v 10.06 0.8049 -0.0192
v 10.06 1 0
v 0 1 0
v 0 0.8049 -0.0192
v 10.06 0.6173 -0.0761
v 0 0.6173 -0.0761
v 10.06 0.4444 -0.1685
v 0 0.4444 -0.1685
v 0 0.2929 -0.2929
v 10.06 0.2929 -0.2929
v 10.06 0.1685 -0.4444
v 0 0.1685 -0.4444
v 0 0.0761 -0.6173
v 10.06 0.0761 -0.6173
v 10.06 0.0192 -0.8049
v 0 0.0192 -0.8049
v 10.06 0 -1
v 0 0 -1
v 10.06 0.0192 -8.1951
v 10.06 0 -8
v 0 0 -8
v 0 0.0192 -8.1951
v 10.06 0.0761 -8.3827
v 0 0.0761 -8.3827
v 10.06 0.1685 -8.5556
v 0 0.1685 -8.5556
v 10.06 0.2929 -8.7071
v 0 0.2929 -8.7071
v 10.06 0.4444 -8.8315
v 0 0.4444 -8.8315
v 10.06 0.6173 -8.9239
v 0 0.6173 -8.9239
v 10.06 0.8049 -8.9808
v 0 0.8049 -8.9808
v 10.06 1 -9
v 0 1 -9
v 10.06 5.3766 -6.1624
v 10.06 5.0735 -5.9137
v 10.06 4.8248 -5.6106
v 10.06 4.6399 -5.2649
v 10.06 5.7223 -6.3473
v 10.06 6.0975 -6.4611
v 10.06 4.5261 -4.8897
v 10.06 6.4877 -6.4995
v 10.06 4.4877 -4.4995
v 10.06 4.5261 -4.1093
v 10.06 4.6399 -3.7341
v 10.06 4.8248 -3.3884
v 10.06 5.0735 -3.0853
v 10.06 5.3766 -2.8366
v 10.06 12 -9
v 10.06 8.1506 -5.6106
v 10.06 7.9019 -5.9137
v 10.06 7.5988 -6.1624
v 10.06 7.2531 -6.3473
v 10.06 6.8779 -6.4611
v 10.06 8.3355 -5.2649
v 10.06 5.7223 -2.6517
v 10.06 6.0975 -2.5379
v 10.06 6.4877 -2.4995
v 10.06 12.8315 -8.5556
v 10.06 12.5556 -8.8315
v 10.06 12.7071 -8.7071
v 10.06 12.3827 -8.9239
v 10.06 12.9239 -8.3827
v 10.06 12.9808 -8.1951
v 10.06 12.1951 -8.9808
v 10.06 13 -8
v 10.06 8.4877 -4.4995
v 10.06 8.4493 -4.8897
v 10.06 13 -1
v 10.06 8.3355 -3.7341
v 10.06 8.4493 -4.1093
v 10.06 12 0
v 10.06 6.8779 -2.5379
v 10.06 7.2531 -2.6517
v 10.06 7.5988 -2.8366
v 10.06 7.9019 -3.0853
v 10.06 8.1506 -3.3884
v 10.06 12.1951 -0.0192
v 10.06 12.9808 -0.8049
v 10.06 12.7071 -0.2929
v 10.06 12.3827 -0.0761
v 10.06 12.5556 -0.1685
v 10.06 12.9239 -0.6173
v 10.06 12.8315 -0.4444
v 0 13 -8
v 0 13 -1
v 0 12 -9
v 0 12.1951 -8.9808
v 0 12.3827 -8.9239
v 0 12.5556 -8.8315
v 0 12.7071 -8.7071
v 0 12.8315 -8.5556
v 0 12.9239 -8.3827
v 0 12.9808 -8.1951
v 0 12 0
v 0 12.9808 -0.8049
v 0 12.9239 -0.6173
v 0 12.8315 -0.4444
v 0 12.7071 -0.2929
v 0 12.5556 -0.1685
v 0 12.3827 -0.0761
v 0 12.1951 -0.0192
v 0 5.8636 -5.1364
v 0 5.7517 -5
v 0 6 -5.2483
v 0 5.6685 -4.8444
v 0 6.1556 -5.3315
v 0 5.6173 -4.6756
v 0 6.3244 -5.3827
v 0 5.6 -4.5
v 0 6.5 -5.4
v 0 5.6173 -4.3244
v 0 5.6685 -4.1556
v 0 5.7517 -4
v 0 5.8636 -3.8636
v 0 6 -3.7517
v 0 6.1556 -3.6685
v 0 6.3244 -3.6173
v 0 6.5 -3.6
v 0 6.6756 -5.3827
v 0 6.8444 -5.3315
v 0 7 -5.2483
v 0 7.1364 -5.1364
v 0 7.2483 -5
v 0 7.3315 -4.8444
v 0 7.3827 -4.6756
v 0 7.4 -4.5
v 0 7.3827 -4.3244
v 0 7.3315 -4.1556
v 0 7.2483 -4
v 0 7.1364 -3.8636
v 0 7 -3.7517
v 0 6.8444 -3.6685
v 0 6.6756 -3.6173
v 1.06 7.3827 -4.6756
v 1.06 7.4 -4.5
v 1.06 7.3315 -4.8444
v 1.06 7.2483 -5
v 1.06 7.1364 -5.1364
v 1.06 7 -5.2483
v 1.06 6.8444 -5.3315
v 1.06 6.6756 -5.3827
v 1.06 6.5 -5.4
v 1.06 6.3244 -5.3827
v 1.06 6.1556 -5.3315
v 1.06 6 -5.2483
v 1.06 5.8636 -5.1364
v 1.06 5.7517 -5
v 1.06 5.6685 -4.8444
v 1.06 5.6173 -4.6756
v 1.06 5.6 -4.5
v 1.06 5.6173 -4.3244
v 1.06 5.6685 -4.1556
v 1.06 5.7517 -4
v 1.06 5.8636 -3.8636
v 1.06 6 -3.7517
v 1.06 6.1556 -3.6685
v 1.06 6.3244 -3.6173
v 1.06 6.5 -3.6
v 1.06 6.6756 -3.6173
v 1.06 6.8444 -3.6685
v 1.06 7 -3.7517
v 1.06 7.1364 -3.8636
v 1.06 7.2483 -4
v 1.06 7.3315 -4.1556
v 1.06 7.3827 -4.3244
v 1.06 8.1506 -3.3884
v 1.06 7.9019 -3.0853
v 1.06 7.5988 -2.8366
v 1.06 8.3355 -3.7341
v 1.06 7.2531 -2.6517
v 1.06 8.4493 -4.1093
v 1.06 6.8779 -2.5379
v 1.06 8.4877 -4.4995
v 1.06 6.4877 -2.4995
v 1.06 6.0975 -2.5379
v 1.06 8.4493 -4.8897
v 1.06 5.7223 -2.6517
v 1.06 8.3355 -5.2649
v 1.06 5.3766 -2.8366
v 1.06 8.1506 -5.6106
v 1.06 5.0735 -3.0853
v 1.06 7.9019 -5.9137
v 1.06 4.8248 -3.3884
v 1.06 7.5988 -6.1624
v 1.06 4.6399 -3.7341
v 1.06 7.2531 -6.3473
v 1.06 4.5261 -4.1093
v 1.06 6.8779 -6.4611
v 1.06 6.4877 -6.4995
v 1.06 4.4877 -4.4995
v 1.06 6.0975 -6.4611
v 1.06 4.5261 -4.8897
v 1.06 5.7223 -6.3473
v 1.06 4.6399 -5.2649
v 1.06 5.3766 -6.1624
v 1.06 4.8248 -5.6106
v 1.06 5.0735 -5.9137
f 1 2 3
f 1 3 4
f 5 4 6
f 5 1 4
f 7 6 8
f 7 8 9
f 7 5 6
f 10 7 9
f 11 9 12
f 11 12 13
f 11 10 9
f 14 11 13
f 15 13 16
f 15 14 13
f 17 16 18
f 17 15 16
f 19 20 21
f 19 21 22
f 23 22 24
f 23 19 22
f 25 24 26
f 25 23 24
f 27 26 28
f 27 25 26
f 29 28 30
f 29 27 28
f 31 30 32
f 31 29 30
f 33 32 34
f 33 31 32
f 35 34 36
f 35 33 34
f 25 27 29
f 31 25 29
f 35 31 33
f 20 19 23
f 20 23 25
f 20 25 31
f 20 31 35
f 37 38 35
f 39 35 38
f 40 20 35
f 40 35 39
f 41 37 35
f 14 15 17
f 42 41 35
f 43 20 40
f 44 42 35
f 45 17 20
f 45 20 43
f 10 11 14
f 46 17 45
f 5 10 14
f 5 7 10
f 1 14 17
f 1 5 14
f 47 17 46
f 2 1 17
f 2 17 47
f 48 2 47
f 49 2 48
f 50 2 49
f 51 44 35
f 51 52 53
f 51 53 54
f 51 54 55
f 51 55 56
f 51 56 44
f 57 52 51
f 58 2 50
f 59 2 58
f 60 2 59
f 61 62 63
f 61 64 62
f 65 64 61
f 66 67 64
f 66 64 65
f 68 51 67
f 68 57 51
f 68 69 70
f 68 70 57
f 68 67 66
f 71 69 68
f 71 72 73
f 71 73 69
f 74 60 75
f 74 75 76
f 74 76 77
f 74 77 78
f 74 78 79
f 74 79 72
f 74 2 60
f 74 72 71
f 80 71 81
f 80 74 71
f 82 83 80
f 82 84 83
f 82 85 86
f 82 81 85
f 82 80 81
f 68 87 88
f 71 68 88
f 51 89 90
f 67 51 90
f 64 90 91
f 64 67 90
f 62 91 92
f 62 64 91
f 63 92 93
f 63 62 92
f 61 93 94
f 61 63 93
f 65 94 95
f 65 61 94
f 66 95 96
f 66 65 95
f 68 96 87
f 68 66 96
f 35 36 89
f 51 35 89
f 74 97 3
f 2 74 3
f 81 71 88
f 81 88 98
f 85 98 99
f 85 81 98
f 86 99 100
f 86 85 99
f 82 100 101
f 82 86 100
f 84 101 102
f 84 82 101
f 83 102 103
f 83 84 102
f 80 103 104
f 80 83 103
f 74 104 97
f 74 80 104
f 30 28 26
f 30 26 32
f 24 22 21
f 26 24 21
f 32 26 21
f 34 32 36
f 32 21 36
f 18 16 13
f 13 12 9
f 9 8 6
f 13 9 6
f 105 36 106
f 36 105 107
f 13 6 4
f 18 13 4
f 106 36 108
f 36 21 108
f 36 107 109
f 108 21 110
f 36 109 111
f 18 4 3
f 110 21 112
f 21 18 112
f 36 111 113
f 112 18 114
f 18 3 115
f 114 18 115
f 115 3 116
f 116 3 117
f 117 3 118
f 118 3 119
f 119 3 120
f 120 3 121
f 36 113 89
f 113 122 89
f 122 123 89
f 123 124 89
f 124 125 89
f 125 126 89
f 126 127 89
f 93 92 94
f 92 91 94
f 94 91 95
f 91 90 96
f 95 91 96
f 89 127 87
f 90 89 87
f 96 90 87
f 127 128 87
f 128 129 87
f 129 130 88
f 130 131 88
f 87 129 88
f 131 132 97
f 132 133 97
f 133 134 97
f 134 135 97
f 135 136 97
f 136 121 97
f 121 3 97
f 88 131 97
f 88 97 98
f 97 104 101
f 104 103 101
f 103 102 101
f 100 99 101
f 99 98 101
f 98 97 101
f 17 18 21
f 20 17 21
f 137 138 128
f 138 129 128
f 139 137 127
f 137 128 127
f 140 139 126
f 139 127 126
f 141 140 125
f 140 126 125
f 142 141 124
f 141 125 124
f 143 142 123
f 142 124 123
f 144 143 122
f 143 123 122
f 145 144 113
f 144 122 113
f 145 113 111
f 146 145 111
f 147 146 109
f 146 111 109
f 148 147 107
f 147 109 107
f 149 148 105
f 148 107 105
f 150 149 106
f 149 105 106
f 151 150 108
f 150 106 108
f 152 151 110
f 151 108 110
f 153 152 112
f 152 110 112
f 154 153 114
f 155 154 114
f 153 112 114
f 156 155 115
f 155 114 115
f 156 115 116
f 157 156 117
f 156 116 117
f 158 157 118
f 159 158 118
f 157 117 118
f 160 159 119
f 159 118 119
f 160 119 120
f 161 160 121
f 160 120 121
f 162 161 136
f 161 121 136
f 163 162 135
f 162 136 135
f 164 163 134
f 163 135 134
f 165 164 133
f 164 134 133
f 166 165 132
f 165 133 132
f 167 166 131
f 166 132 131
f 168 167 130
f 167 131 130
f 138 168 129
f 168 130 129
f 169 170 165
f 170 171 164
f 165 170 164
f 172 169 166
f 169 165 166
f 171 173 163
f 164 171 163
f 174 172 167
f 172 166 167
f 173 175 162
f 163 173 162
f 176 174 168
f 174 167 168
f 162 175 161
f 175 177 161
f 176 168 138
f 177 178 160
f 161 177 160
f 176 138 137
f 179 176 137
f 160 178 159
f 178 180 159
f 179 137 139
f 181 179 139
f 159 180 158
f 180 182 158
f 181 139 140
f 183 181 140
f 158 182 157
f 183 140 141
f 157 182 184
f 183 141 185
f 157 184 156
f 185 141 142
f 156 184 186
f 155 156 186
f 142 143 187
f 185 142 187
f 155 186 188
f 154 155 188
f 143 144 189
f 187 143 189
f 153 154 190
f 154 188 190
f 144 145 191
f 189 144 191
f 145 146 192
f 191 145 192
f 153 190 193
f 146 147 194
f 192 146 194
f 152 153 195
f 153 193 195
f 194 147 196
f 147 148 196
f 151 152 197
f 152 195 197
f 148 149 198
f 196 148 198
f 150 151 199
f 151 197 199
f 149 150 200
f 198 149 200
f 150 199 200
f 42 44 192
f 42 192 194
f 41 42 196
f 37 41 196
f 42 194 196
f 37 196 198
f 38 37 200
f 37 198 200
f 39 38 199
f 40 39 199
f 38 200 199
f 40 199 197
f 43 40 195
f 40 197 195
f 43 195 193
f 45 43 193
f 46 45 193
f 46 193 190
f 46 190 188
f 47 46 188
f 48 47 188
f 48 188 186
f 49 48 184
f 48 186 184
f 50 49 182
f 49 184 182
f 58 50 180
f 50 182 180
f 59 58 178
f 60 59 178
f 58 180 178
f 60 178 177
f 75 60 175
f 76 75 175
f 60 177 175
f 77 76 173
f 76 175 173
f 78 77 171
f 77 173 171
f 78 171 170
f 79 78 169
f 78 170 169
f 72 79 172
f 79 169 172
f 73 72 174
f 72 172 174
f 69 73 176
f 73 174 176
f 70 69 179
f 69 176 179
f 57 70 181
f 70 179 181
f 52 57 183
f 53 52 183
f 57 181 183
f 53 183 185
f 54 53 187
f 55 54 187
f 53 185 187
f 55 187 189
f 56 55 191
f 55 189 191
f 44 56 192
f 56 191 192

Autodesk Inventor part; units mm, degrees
ref_plane "YZ Plane" through (0, 0, 0) normal (1, 0, 0) x (0, 1, 0)
ref_plane "XZ Plane" through (0, 0, 0) normal (0, 1, 0) x (-1, 0, 0)
ref_plane "XY Plane" through (0, 0, 0) normal (0, 0, 1) x (1, 0, 0)
sketch "Boceto3" plane through (0, 0, 0) normal (1, 0, 0) x (0, 1, 0)
  line L0 (0, 0) -> (0, -9)
  line L1 (0, -9) -> (13, -9)
  line L2 (13, -9) -> (13, 0)
  line L3 (13, 0) -> (0, 0)
  circle A0 centre (6.5, -4.5) radius 0.9
  dimension "d3" = 9
  dimension "d4" = 13
  dimension "d7" = 1.8
extrude "Extrusión1" add sketch "Boceto3" along normal blind 10.06
sketch "Boceto4" plane through (10.06, 0, 0) normal (1, 0, 0) x (0, 0, -1)
  point P0 (0, 0)
  point P1 (4.4995, 6.4877)
hole "Agujero1" at (10.06, 6.4877, -4.4995) direction (-1, 0, 0) diameter 4 depth 9
fillet "Empalme1" radius 1 4 edges at (5.03, 13, 0) (5.03, 13, -9) (5.03, 0, 0) (5.03, 0, -9)
properties part number "Soporte placa B1 - B2"
